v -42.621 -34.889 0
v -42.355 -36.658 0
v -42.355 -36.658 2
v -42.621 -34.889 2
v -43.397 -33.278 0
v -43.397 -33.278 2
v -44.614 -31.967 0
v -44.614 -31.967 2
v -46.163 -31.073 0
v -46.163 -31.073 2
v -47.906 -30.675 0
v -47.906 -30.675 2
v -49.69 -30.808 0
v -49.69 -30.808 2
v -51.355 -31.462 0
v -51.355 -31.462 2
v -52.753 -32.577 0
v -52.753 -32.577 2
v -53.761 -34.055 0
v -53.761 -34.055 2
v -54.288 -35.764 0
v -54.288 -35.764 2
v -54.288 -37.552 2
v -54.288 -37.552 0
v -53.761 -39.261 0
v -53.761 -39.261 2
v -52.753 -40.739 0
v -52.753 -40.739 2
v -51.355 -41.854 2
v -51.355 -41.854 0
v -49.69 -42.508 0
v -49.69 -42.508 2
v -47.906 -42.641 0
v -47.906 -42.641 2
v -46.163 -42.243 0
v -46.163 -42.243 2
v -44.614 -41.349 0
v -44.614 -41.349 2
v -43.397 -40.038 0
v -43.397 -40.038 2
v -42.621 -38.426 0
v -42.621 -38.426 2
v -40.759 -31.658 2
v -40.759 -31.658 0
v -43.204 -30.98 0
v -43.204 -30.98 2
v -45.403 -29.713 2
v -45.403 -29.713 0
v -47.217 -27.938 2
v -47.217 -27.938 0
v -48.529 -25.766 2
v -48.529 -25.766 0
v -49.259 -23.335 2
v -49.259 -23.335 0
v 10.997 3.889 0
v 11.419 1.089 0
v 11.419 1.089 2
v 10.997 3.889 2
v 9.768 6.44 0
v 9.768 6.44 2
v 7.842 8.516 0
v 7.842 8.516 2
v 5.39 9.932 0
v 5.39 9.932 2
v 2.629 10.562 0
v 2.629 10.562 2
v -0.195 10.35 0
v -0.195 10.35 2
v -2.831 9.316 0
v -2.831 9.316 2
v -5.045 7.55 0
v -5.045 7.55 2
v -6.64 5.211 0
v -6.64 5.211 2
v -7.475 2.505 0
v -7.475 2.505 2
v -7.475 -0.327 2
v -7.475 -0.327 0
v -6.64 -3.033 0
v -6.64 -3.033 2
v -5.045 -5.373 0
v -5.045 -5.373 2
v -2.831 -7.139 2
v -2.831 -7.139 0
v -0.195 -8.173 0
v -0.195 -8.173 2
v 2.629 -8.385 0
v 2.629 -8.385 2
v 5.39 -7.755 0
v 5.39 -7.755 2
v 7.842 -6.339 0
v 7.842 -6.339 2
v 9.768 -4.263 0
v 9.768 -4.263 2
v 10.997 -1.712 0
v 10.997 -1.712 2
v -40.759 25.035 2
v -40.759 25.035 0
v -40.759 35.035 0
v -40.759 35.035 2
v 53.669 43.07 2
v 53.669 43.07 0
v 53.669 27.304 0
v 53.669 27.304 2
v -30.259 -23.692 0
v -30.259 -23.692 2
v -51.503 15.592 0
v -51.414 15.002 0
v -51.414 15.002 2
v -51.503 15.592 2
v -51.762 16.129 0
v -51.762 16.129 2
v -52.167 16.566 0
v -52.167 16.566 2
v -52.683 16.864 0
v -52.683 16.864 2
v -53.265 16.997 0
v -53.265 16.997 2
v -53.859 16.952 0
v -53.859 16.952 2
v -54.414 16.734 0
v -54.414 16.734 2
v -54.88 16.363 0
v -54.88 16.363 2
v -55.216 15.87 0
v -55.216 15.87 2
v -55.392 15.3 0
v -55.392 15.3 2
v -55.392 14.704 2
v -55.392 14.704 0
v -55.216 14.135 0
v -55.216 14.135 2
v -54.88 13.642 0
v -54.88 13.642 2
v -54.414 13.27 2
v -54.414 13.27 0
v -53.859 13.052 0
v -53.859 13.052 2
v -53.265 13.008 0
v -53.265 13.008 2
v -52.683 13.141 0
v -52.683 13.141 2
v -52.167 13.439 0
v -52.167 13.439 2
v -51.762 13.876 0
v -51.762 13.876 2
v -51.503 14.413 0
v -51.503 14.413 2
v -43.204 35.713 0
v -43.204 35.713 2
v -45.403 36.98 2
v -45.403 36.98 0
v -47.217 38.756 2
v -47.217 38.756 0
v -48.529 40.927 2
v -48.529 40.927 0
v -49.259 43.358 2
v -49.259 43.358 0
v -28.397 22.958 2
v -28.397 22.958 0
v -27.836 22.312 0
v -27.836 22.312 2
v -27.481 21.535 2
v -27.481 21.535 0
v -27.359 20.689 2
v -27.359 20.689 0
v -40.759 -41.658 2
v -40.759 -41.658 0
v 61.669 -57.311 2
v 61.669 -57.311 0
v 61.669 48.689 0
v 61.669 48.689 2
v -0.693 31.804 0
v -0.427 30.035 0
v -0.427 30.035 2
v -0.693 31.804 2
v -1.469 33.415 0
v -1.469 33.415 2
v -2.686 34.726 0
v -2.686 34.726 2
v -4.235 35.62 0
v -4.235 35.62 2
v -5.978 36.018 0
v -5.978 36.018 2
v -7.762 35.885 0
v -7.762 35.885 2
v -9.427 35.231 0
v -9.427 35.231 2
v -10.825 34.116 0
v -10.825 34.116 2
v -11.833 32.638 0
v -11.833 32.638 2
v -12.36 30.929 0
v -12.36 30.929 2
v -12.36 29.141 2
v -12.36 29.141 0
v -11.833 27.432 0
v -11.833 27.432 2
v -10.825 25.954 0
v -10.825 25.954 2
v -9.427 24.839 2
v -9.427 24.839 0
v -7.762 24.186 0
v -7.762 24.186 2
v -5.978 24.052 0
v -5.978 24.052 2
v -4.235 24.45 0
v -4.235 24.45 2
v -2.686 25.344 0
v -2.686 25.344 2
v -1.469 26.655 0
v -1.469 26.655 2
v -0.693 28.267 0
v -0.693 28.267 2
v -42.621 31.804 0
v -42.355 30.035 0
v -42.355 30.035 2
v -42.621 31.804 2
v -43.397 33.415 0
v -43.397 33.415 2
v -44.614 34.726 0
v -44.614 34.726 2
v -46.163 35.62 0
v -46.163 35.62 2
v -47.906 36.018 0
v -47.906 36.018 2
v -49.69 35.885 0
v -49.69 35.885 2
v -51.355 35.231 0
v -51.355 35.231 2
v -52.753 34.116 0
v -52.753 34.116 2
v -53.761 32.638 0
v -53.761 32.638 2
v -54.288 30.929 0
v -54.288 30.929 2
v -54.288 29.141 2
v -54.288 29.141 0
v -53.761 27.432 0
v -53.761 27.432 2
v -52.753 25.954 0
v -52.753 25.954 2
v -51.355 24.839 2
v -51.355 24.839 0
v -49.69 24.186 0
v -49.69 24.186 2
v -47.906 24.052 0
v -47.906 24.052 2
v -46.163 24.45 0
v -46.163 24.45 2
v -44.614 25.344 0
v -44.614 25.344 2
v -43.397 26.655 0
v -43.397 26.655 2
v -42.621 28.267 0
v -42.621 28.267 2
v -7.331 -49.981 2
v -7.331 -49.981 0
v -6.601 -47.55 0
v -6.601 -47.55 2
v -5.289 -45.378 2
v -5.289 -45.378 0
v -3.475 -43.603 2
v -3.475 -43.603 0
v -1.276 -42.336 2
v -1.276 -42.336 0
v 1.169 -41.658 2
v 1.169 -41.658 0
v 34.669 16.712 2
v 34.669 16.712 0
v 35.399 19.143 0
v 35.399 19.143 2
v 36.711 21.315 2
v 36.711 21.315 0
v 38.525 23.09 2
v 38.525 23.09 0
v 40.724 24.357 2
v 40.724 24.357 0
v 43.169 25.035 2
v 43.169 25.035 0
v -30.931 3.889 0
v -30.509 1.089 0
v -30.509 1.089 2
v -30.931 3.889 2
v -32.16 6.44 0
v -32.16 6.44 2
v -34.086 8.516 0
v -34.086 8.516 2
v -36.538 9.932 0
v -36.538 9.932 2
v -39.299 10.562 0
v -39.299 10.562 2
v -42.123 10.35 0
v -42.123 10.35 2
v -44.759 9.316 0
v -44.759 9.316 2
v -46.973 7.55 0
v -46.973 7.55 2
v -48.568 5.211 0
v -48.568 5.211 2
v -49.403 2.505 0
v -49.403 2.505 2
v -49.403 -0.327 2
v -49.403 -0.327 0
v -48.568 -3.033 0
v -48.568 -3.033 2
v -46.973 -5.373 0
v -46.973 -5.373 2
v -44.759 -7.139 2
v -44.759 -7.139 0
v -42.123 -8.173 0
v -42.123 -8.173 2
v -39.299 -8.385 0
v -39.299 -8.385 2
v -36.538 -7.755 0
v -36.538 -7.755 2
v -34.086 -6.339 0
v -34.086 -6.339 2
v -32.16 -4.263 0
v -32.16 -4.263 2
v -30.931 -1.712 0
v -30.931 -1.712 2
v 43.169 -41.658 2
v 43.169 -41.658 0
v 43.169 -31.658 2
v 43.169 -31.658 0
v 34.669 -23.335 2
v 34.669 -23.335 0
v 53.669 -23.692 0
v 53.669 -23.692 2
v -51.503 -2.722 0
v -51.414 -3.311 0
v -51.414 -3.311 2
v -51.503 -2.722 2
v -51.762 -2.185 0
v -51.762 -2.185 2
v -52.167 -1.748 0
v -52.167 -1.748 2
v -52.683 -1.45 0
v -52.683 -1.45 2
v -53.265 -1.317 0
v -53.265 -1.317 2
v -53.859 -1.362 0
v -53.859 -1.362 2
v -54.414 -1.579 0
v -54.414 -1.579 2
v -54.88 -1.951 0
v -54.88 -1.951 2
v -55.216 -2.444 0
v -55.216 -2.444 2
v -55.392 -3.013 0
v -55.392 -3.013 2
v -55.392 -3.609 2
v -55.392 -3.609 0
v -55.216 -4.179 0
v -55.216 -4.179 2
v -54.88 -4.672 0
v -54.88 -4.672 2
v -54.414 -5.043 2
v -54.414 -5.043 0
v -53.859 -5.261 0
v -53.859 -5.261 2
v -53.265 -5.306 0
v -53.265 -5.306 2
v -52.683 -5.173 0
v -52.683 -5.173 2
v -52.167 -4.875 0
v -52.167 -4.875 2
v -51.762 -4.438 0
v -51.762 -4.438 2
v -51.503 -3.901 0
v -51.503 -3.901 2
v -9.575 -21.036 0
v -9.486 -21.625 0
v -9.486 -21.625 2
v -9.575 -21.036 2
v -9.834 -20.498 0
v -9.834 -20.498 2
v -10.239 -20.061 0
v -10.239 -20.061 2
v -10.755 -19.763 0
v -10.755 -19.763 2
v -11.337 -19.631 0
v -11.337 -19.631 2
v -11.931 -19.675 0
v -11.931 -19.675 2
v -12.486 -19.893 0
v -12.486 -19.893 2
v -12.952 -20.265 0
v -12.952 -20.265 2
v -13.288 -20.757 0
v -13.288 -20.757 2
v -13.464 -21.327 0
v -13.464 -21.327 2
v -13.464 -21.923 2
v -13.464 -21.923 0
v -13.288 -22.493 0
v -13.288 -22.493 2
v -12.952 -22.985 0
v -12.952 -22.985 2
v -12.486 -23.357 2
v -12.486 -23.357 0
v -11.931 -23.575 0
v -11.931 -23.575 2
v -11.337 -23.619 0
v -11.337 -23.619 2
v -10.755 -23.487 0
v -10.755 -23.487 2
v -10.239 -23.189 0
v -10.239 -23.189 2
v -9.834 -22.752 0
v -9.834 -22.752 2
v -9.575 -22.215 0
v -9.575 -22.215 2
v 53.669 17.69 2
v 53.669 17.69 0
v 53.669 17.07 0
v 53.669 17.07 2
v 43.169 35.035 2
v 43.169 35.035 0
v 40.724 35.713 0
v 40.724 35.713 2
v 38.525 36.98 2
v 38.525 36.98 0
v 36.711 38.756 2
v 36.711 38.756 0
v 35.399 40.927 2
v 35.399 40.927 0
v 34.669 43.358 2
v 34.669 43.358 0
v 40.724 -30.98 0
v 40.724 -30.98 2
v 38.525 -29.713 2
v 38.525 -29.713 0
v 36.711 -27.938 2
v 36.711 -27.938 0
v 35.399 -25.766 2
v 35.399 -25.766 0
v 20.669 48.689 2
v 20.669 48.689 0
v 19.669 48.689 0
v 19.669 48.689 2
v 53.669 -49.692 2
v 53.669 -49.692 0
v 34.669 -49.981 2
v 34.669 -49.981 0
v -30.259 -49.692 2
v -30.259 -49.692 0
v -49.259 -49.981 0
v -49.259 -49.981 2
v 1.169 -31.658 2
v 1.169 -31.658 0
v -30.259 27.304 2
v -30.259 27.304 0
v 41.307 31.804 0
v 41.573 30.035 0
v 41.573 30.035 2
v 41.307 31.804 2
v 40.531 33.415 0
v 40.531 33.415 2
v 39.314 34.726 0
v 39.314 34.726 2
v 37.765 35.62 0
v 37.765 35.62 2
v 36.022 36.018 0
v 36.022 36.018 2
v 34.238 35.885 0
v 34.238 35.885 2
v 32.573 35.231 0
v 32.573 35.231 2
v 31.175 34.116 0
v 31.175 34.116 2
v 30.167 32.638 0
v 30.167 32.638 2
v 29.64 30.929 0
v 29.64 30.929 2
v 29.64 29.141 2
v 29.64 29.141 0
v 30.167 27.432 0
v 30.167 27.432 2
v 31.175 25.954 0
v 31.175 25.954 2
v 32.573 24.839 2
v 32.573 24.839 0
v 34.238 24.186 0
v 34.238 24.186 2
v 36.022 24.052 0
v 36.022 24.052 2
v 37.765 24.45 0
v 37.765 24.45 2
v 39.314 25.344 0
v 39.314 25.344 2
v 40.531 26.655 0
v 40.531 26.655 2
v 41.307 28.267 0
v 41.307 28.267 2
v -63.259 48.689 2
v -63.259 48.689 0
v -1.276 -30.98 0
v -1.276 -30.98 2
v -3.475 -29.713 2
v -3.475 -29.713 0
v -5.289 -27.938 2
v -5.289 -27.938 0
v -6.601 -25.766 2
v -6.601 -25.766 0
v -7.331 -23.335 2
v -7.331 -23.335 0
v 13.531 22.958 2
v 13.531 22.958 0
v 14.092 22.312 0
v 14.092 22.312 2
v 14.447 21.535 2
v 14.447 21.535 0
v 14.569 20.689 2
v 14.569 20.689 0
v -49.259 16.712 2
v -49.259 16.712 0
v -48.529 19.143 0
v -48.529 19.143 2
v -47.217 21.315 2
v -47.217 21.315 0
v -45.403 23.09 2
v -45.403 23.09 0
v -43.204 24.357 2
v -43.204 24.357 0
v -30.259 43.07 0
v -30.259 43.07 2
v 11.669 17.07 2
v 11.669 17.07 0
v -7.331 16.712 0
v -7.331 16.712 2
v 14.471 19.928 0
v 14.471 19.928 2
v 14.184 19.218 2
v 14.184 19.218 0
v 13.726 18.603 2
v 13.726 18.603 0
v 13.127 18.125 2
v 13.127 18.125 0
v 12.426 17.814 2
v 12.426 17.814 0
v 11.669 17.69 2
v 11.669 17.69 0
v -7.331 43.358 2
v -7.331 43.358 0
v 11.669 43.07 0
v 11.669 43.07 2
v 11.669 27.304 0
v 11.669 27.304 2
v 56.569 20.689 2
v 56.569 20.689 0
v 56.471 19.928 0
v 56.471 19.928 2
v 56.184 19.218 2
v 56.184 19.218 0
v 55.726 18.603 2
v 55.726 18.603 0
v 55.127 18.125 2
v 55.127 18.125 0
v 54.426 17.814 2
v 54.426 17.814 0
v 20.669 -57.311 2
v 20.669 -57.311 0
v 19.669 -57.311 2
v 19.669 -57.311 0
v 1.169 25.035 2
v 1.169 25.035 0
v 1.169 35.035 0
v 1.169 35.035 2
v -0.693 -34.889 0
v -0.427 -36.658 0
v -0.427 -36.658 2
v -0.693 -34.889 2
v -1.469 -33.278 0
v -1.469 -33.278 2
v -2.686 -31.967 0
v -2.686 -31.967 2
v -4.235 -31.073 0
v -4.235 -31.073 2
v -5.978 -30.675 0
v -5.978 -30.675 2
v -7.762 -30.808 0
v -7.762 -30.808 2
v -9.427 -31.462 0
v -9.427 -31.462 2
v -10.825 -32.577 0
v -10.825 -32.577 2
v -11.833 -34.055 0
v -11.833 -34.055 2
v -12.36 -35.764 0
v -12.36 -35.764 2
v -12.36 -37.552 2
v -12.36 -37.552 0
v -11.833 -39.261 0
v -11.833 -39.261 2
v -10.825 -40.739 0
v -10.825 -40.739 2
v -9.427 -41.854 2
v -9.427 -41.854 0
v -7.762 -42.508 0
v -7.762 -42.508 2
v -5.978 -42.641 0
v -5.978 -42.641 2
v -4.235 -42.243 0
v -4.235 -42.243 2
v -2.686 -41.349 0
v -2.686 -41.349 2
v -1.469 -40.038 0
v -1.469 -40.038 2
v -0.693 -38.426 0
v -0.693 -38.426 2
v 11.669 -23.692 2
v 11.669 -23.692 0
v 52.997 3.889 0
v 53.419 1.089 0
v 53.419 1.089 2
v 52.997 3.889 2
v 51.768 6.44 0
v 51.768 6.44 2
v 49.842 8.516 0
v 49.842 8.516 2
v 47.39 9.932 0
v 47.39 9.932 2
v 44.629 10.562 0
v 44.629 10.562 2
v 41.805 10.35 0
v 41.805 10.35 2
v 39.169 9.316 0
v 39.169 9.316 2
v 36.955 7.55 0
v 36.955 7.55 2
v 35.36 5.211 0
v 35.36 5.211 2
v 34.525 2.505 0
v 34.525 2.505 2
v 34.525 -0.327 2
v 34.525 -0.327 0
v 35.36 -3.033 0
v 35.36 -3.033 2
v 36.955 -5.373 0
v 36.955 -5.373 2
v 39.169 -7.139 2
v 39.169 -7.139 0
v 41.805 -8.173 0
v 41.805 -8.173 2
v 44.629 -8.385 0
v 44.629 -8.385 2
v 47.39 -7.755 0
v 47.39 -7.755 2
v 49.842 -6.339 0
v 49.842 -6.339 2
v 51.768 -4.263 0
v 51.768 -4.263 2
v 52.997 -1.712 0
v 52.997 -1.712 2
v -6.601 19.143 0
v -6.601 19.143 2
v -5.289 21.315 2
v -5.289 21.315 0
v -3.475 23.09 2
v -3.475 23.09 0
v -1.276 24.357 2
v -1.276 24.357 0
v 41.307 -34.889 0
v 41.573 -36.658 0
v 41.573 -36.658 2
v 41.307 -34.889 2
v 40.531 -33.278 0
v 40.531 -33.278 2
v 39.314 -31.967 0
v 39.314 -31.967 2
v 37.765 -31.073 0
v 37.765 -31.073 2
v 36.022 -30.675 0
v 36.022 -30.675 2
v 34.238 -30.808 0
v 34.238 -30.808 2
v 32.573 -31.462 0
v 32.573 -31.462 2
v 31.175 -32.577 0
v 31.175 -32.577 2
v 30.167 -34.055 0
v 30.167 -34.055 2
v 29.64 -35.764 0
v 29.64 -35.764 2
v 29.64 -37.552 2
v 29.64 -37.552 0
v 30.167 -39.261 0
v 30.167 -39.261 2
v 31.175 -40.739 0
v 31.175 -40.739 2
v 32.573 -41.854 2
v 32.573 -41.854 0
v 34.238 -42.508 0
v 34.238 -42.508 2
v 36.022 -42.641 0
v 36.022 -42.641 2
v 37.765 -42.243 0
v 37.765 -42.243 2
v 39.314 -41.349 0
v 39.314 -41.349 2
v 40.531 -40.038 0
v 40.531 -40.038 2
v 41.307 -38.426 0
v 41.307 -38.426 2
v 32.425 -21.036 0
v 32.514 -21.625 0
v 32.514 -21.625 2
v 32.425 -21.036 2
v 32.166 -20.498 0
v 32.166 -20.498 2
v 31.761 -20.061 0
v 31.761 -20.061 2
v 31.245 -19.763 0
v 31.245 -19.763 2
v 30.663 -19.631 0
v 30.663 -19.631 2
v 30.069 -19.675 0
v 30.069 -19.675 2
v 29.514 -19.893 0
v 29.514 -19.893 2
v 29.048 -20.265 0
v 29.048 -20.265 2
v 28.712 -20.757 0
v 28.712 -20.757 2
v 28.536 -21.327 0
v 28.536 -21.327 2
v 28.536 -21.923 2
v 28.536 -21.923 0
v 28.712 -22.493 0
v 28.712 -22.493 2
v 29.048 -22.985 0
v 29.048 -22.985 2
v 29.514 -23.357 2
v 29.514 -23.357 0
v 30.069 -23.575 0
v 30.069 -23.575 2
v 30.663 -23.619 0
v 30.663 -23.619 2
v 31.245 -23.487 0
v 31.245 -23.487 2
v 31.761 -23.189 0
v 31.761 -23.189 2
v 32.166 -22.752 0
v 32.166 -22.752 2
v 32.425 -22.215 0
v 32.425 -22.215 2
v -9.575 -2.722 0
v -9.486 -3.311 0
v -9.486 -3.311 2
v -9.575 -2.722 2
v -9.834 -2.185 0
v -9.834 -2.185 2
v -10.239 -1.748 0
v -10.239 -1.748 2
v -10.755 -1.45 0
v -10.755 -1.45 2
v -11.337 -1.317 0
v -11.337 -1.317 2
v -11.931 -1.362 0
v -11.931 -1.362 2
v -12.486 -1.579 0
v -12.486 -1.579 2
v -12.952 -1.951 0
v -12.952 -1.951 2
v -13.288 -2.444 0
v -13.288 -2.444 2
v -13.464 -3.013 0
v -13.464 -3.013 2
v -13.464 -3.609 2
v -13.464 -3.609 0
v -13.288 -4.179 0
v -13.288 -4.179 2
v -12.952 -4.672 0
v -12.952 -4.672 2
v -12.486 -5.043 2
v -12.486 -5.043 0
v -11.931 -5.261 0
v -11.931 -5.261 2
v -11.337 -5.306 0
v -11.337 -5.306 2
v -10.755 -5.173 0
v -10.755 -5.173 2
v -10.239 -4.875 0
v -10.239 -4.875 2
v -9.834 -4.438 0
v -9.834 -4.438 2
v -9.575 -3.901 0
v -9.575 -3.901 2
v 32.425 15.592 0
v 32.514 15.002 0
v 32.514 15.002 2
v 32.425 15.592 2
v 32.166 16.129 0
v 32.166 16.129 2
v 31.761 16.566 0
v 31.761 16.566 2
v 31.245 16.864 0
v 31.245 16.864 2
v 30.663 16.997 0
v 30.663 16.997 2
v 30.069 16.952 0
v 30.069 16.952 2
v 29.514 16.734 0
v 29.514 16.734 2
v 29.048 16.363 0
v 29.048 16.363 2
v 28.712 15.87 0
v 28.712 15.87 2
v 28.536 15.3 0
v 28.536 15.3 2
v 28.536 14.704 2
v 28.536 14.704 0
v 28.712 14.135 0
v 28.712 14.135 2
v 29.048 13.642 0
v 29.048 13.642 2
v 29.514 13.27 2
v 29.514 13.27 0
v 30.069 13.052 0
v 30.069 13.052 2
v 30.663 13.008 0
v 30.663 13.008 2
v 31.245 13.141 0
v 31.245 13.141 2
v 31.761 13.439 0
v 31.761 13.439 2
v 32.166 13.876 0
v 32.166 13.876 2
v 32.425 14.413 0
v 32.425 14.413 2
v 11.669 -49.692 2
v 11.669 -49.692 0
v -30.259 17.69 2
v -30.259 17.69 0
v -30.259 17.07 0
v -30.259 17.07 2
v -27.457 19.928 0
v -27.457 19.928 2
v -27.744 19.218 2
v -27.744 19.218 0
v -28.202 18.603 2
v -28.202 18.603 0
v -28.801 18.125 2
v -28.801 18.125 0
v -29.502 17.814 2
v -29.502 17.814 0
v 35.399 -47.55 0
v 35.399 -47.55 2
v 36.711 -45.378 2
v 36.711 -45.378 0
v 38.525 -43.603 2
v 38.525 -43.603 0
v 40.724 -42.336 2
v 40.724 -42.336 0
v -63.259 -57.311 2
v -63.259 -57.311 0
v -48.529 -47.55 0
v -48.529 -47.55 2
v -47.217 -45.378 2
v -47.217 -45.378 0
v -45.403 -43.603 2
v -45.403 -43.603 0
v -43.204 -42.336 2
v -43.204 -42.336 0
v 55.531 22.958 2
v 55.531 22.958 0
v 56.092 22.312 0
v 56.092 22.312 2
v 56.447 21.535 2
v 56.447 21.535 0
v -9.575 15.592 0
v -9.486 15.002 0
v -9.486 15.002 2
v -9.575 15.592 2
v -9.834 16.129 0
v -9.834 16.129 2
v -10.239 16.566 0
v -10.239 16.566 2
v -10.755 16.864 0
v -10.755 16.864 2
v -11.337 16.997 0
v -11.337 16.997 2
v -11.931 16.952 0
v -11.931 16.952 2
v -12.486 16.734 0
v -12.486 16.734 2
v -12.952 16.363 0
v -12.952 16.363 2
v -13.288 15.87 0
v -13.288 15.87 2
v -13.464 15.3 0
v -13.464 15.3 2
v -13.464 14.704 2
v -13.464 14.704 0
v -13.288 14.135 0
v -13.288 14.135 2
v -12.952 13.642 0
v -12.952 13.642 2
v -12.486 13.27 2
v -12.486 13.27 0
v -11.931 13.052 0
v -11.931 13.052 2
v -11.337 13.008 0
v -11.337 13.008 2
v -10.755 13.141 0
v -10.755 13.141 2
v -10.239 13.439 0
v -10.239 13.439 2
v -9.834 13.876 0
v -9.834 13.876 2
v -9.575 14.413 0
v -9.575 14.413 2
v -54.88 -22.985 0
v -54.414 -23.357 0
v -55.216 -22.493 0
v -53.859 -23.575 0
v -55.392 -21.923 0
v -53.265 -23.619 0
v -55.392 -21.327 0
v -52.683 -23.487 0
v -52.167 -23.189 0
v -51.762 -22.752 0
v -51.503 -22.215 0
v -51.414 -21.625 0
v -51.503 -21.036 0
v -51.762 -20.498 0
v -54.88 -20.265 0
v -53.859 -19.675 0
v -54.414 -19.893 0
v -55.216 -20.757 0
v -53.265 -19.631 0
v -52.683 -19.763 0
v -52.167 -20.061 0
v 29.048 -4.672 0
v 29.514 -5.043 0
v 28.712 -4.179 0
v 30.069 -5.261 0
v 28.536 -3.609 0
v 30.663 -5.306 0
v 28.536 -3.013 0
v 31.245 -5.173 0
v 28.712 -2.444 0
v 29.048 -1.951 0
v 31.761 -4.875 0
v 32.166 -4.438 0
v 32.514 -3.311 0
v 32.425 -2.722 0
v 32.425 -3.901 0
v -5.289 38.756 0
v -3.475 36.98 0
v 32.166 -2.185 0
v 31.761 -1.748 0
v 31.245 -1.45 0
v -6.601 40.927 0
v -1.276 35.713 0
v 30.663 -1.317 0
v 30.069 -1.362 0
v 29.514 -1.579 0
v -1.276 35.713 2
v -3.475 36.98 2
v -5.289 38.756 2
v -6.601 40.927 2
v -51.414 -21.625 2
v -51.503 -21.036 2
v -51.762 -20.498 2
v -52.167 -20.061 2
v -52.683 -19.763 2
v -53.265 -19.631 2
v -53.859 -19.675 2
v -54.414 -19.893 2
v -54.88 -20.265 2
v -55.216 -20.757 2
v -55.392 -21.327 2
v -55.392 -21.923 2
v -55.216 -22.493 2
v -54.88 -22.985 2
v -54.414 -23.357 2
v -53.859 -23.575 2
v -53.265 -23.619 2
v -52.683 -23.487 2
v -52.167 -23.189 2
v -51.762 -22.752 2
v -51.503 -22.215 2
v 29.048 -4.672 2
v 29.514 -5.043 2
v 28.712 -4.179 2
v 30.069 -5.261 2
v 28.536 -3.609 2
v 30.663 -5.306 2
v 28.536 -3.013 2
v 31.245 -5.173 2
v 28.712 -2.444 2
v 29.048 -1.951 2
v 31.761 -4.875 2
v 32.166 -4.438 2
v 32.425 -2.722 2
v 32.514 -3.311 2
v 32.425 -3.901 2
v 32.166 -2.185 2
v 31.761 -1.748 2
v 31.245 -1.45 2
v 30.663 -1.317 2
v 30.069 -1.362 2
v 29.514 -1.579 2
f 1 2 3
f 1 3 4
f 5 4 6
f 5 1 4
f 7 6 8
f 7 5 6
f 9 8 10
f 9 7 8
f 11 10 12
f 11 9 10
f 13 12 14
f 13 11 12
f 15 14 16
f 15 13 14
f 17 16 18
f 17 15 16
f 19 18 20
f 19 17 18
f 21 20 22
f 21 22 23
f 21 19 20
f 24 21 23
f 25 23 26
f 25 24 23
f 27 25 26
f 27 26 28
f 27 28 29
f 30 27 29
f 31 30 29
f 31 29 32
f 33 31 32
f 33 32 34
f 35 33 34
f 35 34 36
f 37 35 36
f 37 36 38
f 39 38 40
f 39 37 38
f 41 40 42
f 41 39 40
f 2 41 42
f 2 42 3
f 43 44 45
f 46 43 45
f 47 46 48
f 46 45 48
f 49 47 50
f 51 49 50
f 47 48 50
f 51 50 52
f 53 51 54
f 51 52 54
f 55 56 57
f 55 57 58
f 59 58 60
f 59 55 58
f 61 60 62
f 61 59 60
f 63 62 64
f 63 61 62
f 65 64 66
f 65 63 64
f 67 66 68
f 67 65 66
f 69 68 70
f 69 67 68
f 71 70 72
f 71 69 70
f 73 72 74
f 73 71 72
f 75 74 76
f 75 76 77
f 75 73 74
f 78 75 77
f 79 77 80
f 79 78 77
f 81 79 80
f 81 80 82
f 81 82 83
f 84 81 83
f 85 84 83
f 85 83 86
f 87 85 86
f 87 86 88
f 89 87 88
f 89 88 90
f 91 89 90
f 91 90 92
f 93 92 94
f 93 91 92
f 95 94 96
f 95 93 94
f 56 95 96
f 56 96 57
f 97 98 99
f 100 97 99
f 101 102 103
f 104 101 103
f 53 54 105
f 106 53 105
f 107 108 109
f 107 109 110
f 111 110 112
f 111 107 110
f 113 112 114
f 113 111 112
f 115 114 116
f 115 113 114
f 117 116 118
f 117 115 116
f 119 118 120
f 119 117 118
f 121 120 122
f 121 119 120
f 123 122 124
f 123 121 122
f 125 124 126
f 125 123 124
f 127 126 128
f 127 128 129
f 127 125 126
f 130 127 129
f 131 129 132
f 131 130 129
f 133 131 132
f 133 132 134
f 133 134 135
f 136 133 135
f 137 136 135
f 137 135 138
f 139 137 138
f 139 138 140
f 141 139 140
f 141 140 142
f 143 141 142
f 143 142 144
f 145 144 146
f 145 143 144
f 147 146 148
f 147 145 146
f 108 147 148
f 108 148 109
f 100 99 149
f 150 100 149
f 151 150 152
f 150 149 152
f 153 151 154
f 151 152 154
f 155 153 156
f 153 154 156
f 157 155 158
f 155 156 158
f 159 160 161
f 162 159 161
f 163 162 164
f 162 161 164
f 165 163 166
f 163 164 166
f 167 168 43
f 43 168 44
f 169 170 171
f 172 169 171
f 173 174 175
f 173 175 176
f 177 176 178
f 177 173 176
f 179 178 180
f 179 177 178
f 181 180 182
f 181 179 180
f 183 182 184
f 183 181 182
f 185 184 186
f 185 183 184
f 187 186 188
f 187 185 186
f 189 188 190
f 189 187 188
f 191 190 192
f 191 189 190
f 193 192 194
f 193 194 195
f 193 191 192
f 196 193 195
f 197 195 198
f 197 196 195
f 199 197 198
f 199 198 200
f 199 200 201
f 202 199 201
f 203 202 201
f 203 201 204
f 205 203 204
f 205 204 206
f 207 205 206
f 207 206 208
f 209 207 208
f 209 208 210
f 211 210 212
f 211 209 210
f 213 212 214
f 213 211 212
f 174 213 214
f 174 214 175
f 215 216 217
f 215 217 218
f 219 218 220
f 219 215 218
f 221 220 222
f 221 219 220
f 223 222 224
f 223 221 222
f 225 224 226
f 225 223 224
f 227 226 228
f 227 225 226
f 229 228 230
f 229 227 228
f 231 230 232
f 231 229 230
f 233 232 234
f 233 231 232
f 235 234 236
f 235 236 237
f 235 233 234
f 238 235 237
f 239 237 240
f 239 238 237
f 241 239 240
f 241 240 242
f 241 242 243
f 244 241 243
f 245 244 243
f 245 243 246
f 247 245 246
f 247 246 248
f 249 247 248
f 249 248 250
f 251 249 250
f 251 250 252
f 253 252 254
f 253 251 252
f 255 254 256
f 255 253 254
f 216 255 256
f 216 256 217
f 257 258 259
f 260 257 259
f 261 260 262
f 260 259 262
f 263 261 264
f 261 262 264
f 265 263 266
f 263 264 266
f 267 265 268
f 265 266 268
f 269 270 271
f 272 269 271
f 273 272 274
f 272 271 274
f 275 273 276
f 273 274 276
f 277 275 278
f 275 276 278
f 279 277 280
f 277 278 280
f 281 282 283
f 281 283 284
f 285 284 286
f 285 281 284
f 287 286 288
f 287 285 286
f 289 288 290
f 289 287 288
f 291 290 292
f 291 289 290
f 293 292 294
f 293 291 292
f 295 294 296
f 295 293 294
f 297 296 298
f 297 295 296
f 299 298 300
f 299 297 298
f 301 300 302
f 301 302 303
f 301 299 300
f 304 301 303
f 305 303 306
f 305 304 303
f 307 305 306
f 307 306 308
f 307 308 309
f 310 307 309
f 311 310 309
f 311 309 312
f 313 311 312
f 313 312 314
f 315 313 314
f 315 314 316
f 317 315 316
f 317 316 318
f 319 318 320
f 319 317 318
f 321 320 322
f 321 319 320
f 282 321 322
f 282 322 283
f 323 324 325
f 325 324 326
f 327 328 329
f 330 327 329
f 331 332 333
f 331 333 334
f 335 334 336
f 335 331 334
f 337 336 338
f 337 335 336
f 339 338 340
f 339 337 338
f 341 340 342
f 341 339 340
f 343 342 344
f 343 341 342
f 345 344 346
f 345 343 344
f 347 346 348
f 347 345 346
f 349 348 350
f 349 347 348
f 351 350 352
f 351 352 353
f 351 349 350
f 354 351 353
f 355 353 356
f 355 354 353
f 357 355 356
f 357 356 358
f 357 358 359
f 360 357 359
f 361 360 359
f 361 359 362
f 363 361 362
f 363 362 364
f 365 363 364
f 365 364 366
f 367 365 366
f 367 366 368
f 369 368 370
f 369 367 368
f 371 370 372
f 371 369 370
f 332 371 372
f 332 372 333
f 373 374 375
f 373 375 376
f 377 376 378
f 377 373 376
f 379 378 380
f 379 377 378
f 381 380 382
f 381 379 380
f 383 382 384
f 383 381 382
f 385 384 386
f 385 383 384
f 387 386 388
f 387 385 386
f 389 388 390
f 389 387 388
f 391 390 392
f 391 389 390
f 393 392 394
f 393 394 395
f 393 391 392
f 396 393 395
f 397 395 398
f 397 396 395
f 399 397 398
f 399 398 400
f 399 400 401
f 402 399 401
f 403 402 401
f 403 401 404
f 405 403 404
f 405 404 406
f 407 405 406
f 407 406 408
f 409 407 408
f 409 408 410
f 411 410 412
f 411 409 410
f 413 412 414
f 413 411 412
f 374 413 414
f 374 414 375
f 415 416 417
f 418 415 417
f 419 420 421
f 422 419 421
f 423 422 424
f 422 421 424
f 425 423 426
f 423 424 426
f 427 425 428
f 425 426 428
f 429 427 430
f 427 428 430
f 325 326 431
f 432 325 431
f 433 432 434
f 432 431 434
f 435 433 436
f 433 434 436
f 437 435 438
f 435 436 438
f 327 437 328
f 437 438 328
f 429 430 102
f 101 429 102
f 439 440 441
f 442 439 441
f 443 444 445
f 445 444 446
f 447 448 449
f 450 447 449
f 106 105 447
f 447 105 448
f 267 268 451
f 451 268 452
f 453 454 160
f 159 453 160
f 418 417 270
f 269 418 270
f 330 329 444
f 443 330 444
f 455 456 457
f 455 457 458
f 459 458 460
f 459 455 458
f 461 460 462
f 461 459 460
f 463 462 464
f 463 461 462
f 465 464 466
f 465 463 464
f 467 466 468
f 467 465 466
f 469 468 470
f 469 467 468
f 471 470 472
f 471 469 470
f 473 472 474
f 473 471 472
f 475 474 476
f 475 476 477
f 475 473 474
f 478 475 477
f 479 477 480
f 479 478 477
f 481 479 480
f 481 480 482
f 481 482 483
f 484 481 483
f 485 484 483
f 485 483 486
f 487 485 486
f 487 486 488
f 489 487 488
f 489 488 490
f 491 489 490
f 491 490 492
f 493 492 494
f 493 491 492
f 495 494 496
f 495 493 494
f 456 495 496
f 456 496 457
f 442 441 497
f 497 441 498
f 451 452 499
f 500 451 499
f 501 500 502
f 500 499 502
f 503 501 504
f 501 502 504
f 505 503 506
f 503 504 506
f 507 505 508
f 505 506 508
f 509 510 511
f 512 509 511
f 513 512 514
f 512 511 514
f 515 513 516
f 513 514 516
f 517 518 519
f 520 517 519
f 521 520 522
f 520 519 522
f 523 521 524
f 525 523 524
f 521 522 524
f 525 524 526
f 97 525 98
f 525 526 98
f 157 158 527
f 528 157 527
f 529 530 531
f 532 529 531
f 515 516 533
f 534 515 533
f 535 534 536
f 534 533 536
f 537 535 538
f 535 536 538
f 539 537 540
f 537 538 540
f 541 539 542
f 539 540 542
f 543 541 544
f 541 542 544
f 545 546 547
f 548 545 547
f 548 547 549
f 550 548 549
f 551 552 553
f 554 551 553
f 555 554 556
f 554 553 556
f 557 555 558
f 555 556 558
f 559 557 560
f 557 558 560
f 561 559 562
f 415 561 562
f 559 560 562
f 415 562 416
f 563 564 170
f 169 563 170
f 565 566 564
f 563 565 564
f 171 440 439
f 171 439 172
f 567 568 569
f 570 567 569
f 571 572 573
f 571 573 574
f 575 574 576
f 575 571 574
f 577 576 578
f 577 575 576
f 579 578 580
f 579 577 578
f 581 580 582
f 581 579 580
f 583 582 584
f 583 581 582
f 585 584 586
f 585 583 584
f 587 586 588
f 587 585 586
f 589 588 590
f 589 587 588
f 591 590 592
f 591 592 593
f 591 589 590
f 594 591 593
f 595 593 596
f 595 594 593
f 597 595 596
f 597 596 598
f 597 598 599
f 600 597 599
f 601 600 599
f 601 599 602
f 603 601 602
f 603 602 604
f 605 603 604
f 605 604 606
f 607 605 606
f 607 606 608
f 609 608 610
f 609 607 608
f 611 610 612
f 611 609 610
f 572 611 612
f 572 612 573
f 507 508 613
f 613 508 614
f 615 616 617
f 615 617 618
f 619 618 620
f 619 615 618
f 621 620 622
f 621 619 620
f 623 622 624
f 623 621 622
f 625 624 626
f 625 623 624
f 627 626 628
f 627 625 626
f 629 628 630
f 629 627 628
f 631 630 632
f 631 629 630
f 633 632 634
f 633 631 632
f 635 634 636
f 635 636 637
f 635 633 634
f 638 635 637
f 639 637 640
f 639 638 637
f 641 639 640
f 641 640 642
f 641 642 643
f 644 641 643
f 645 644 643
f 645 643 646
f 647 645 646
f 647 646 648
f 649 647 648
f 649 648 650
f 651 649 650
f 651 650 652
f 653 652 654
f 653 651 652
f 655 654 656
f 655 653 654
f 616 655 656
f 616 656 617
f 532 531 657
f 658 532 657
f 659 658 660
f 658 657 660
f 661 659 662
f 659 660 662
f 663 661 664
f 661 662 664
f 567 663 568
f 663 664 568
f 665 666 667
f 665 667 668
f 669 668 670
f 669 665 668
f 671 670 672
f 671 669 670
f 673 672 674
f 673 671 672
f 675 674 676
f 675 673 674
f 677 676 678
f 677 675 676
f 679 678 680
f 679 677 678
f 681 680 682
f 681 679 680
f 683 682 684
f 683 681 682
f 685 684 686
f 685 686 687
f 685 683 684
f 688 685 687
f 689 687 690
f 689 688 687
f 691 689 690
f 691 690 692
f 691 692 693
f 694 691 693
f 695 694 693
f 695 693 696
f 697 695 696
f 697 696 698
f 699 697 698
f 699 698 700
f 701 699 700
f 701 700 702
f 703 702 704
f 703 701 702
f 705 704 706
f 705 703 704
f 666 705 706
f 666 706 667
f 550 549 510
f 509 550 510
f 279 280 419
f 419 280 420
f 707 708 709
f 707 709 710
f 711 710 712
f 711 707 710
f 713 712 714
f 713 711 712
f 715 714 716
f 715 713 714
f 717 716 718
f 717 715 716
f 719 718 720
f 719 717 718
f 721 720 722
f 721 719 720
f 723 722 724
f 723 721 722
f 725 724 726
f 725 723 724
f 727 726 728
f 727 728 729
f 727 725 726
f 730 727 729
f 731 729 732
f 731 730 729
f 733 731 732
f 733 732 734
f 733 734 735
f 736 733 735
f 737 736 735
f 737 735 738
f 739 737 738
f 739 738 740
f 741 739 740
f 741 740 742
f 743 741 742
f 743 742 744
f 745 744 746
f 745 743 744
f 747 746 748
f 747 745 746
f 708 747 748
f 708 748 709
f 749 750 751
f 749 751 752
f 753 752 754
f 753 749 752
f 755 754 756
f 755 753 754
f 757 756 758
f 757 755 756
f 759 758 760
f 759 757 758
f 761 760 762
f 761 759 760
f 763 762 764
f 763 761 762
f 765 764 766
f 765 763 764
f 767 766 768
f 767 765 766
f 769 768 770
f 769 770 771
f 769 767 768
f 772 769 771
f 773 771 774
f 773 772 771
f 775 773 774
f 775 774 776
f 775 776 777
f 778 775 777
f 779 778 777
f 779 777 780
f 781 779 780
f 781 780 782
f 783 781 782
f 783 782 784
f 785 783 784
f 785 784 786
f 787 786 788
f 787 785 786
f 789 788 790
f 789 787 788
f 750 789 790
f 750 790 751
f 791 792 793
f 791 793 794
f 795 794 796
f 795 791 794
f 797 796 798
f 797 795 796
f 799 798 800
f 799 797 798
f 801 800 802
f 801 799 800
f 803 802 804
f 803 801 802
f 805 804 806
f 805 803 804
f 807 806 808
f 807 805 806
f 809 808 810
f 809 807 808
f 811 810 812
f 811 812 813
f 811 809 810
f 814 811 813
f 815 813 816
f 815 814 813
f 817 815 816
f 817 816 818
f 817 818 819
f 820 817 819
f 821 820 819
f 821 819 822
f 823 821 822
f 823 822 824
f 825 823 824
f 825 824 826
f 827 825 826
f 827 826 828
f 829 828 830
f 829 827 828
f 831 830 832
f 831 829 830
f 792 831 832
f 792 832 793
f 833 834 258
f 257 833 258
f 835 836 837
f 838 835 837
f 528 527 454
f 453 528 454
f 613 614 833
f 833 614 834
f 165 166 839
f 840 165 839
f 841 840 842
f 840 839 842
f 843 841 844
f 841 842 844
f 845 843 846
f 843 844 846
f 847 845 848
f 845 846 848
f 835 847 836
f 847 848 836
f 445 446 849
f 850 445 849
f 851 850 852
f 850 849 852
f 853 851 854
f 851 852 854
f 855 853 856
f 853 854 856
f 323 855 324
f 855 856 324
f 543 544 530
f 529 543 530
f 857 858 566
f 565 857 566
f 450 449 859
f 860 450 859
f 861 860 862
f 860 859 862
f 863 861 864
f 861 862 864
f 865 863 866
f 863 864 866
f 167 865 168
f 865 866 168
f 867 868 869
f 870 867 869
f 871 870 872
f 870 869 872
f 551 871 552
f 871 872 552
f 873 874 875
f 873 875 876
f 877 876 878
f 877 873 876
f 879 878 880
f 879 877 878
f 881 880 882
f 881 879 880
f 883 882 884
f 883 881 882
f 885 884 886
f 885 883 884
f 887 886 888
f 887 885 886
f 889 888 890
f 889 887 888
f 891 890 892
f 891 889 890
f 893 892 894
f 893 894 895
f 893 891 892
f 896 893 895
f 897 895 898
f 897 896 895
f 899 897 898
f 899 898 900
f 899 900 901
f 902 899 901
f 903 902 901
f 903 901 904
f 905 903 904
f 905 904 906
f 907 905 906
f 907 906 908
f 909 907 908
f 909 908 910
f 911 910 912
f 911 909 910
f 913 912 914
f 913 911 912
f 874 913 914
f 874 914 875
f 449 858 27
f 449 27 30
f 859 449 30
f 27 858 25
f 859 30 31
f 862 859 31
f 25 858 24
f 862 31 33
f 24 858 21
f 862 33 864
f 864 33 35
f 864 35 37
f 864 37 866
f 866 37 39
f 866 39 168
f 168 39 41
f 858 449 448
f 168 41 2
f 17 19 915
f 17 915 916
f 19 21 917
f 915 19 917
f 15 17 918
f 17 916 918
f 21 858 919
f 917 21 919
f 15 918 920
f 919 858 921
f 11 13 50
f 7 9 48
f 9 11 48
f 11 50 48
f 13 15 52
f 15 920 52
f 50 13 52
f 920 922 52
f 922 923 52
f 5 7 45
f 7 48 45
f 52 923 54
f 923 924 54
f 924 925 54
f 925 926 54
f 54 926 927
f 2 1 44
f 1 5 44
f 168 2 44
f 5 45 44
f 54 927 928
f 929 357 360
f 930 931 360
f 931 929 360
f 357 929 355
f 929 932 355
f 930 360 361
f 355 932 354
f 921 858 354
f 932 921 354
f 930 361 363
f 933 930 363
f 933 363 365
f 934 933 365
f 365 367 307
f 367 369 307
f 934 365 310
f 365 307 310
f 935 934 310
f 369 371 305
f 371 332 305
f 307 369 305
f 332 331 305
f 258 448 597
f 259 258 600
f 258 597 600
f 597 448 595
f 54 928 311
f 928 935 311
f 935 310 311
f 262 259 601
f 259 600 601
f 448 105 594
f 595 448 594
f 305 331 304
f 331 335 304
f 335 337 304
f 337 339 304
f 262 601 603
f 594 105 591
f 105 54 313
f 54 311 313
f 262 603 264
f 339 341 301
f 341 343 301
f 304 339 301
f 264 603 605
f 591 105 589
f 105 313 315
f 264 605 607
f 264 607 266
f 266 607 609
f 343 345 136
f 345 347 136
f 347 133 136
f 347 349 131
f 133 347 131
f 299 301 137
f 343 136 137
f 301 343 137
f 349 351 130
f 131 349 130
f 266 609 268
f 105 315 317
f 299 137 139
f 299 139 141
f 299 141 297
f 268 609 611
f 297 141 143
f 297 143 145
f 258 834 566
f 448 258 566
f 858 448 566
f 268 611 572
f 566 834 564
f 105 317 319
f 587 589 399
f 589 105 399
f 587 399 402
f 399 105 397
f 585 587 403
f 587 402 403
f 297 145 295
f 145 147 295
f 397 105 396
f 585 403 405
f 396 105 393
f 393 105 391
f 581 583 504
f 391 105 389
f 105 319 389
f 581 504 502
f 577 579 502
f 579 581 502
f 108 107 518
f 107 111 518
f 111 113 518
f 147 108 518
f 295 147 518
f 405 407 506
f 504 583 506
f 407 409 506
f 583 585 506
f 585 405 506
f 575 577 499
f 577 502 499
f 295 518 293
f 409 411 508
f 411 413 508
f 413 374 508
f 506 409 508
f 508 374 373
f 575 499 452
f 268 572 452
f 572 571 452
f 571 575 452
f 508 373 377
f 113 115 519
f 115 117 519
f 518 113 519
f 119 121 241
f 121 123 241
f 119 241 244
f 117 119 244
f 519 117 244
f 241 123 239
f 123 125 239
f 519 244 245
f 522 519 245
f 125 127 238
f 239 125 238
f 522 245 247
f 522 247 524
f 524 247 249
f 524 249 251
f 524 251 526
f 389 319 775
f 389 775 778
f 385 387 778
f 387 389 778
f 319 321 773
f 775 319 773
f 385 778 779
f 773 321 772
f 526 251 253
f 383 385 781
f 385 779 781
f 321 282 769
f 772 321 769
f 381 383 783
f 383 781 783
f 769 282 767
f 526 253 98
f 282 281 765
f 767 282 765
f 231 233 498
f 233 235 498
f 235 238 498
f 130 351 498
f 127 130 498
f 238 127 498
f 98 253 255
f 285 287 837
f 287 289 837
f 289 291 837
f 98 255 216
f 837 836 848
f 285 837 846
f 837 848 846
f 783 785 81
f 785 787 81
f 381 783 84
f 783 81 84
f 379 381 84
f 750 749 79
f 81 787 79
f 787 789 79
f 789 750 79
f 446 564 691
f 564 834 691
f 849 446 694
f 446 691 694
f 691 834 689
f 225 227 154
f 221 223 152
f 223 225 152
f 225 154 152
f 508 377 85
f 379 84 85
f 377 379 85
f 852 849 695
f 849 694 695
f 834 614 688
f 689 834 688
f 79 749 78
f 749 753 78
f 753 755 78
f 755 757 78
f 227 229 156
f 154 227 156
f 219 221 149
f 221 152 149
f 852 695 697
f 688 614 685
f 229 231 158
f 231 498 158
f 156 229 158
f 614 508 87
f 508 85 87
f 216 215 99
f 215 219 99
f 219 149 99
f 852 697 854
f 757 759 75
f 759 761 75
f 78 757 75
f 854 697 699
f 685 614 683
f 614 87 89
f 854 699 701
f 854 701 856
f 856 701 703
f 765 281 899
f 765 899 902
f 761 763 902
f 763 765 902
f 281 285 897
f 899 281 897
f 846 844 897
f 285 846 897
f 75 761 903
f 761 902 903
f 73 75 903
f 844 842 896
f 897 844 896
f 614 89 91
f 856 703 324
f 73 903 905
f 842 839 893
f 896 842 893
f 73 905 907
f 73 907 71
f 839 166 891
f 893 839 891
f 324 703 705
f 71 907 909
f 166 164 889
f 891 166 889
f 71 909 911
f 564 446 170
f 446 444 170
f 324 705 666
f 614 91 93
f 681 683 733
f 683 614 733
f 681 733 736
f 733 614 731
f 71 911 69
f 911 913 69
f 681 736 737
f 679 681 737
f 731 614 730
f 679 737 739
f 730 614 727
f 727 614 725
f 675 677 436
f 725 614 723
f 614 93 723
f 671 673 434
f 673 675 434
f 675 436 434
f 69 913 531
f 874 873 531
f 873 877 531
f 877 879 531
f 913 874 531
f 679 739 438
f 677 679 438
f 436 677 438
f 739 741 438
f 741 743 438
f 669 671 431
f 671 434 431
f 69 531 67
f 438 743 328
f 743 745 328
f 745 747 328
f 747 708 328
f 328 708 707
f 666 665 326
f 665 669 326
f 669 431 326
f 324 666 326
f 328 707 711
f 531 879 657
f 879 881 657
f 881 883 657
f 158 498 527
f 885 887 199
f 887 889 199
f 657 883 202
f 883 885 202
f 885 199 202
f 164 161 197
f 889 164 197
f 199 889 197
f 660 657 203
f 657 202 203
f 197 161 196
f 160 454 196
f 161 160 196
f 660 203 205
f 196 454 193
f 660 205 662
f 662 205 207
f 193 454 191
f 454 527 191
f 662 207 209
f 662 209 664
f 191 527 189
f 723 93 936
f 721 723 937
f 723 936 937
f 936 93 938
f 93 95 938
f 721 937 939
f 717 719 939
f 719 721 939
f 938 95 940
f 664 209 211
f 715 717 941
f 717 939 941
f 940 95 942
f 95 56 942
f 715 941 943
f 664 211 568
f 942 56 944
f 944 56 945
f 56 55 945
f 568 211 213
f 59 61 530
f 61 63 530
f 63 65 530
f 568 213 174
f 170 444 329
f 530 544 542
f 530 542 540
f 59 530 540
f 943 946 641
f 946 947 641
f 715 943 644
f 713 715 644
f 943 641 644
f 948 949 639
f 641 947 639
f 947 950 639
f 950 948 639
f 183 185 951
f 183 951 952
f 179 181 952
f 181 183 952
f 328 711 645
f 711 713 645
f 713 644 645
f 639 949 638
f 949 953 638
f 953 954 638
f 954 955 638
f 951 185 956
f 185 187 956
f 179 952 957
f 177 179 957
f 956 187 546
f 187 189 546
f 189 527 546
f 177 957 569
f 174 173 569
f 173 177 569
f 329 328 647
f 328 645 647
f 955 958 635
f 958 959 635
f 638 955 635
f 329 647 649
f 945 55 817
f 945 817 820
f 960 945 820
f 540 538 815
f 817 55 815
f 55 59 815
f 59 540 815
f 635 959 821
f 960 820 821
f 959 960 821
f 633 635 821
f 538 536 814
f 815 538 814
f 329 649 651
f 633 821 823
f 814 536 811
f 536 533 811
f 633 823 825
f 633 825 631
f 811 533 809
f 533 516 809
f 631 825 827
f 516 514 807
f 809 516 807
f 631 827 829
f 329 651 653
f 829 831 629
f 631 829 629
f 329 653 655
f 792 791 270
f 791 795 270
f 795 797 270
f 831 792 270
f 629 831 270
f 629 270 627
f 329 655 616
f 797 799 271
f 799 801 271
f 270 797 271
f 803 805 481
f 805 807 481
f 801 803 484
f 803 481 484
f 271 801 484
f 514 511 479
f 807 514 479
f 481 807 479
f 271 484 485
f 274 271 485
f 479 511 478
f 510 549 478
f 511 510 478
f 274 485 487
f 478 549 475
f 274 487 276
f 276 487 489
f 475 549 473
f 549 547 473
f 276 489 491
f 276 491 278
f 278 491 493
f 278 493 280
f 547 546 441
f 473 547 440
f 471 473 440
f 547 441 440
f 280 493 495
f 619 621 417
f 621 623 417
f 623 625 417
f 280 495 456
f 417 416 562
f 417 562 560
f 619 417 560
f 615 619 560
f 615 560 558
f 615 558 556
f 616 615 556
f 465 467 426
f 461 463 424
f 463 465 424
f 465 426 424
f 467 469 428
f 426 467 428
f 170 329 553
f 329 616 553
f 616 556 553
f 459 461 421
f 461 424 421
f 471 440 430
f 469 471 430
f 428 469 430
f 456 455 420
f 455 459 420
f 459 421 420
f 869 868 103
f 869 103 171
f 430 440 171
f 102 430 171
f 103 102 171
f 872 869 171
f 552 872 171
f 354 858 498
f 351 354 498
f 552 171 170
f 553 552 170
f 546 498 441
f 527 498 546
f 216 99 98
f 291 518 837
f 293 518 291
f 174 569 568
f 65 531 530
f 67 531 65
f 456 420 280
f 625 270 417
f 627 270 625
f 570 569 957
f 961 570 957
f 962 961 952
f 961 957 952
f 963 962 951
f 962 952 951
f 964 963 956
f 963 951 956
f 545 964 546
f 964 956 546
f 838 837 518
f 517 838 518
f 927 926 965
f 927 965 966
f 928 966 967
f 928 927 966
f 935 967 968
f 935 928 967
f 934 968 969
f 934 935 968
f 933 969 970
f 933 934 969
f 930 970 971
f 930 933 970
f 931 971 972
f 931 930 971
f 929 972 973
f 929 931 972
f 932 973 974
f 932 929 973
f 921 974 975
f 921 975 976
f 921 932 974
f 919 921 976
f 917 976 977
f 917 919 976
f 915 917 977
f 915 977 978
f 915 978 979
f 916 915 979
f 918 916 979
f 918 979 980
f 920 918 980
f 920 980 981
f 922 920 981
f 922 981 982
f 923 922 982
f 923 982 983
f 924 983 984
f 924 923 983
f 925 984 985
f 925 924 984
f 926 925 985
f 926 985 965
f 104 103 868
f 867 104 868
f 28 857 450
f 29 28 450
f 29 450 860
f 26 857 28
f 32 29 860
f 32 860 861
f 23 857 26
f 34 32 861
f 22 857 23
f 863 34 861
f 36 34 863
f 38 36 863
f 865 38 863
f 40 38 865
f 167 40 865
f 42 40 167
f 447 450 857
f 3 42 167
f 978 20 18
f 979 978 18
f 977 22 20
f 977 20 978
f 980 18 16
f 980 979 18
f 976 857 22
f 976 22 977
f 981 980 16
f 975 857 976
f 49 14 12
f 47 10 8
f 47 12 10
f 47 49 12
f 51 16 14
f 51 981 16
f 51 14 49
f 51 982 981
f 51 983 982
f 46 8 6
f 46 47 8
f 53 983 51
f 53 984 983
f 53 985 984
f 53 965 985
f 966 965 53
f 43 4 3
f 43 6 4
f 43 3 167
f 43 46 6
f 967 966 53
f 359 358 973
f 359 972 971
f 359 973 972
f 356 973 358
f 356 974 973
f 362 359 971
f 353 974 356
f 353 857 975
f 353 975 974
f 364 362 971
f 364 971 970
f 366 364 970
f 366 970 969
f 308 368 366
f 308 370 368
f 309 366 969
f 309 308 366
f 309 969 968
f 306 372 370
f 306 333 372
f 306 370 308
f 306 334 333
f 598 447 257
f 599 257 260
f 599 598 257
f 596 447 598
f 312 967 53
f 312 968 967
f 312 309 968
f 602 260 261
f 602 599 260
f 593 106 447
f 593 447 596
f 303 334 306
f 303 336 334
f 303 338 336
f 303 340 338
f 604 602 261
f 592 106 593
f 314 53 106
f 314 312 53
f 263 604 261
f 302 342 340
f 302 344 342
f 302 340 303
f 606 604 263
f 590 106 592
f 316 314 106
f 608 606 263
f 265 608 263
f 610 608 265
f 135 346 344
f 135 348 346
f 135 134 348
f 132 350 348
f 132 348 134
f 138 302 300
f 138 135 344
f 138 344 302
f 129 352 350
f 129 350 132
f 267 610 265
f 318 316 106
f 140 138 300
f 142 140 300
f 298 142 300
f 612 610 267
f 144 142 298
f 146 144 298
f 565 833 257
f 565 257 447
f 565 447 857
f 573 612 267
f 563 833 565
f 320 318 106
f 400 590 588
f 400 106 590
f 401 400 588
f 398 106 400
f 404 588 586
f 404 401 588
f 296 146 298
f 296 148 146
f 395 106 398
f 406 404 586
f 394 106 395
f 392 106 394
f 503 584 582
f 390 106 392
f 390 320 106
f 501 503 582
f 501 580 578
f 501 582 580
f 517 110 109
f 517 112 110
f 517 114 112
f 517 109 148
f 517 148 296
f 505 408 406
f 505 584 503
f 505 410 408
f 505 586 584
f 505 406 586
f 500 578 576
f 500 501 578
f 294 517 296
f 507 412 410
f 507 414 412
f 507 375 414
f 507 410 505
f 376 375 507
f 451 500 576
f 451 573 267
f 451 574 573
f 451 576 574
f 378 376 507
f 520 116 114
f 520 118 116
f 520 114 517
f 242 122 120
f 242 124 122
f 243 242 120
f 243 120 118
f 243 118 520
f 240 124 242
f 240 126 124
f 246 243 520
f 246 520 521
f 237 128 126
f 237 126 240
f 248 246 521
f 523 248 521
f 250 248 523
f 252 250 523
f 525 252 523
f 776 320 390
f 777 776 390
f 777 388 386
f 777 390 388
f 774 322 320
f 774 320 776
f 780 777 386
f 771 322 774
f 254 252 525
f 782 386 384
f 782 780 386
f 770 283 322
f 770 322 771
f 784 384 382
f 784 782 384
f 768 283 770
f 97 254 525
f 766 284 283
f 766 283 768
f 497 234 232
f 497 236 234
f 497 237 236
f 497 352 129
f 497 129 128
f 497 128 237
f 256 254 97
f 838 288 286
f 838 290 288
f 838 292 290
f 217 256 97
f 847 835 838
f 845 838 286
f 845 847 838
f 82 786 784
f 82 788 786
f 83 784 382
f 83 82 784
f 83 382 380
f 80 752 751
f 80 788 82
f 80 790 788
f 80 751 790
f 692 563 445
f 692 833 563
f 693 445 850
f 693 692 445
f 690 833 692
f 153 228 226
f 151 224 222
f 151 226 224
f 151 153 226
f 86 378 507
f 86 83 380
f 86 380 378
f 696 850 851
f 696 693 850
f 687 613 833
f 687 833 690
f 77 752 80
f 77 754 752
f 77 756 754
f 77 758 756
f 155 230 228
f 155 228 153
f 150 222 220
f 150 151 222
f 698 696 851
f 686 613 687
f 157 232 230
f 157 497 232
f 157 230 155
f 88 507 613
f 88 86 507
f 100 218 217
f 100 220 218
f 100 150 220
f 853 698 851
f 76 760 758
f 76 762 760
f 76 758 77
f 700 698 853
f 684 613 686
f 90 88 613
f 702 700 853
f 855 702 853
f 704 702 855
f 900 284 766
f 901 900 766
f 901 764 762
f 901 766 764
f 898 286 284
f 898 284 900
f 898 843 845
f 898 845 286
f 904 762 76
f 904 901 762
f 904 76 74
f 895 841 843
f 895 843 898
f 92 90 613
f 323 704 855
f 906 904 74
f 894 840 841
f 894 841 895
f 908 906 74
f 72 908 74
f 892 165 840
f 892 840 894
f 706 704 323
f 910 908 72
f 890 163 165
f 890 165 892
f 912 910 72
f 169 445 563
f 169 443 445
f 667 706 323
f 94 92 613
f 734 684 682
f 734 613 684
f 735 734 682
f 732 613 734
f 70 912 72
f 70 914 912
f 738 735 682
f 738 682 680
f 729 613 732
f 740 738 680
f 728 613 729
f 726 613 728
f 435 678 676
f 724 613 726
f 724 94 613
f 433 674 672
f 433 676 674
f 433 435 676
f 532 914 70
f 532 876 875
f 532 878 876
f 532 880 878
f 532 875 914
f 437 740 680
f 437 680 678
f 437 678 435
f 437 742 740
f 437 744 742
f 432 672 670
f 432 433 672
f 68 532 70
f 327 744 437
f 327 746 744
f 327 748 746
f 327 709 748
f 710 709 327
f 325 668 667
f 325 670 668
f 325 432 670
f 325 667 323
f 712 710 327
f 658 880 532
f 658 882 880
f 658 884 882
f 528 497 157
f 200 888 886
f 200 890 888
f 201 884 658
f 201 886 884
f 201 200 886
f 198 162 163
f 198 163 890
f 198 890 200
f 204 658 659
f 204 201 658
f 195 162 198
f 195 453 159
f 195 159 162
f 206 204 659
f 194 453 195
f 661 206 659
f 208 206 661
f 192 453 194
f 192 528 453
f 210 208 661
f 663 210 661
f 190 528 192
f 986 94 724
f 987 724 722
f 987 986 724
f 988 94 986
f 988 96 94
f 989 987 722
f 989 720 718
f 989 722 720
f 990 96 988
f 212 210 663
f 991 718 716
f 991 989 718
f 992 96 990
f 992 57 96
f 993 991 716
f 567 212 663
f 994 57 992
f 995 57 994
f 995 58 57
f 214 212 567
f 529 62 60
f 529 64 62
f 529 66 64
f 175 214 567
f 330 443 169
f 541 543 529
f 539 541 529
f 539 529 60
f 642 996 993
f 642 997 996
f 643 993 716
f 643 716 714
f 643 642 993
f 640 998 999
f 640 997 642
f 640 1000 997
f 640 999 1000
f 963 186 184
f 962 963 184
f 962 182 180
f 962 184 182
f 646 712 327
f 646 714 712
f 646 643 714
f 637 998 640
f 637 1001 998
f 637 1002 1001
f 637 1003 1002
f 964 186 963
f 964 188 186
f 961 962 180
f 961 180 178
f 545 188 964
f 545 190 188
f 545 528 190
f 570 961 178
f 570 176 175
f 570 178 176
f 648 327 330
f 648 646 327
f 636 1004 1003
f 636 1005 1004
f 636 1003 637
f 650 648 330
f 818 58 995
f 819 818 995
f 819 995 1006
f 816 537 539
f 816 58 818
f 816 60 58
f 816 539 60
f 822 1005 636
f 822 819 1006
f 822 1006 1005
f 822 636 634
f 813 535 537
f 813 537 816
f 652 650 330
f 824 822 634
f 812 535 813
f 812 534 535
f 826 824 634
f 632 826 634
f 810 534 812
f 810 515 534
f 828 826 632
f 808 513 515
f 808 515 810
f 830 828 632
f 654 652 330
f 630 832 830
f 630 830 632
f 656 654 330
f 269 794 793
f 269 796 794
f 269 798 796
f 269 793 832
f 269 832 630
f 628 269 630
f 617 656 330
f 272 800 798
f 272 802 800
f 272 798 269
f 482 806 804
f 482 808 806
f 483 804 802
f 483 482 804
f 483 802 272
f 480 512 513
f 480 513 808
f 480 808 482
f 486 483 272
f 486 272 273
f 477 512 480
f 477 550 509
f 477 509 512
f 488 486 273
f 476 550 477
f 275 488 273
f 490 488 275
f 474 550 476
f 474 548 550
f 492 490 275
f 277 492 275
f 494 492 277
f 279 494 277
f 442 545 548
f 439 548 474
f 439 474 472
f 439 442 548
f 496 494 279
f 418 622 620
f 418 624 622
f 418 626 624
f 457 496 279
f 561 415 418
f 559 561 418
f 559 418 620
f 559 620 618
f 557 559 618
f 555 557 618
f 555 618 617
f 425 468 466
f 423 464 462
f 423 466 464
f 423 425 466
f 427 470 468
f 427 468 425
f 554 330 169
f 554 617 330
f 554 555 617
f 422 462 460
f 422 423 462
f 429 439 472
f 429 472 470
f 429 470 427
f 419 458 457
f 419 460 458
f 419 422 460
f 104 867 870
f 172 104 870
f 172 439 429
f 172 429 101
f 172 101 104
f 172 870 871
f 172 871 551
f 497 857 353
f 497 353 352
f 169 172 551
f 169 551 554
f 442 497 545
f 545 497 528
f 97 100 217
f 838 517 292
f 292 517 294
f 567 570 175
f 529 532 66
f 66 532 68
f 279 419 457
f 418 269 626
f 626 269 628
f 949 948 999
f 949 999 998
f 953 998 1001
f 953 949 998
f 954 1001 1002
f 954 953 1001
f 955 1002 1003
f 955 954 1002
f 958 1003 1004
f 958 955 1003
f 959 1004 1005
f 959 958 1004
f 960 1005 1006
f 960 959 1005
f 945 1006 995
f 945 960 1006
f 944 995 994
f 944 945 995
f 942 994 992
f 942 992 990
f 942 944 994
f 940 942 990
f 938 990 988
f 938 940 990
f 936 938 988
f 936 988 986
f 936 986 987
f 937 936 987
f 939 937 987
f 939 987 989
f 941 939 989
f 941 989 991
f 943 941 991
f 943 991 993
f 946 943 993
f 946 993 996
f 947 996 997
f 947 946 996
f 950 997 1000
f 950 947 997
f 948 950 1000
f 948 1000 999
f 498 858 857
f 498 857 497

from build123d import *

# Parameters (mm, degrees)
F0_W     = 41
F0_H     = 106
F0_R     = 6
F0_R_2   = 2
F0_R_3   = 9.5
F0_W_2   = 0.927996
F1_DEPTH = 2


with BuildPart() as f1:
    # F0 (on Top) → F1 (new body)
    with BuildSketch(Plane.XY):
        with Locations((-42.758821, -4.311392)):
            Rectangle(F0_W, F0_H)
        with Locations((-48.35481, -36.657964)):
            Circle(F0_R, mode=Mode.SUBTRACT)
        with BuildLine():
            ThreePointArc((-40.758821, -31.657964), (-46.365975, -28.882496), (-49.258821, -23.334988))
            Line((-49.258821, -23.334988), (-30.258821, -23.692439))
            Line((-30.258821, -23.692439), (-30.258821, -49.692439))
            Line((-30.258821, -49.692439), (-49.258821, -49.98094))
            ThreePointArc((-49.258821, -49.98094), (-46.365975, -44.433432), (-40.758821, -41.657964))
            Line((-40.758821, -41.657964), (-40.758821, -31.657964))
        make_face(mode=Mode.SUBTRACT)
        with Locations((-53.414003, -21.625079)):
            Circle(F0_R_2, mode=Mode.SUBTRACT)
        with Locations((-53.414003, -3.311392)):
            Circle(F0_R_2, mode=Mode.SUBTRACT)
        with Locations((-40.008821, 1.088608)):
            Circle(F0_R_3, mode=Mode.SUBTRACT)
        with Locations((-53.414003, 15.002295)):
            Circle(F0_R_2, mode=Mode.SUBTRACT)
        with Locations((-48.35481, 30.03518)):
            Circle(F0_R, mode=Mode.SUBTRACT)
        with BuildLine():
            ThreePointArc((-40.758821, 35.03518), (-46.365975, 37.810648), (-49.258821, 43.358156))
            Line((-49.258821, 43.358156), (-30.258821, 43.069655))
            Line((-30.258821, 43.069655), (-30.258821, 27.304233))
            Line((-30.258821, 27.304233), (-28.396592, 22.957894))
            ThreePointArc((-28.396592, 22.957894), (-27.630572, 21.936268), (-27.358821, 20.688608))
            ThreePointArc((-27.358821, 20.688608), (-28.202435, 18.602943), (-30.258821, 17.690275))
            Line((-30.258821, 17.690275), (-30.258821, 17.069655))
            Line((-30.258821, 17.069655), (-49.258821, 16.712204))
            ThreePointArc((-49.258821, 16.712204), (-46.365975, 22.259712), (-40.758821, 25.03518))
            Line((-40.758821, 25.03518), (-40.758821, 35.03518))
        make_face(mode=Mode.SUBTRACT)
        with Locations((-21.794823, -4.311392)):
            Rectangle(F0_W_2, F0_H)
        with Locations((-0.830825, -4.311392)):
            Rectangle(F0_W, F0_H)
        with Locations((-6.426815, -36.657964)):
            Circle(F0_R, mode=Mode.SUBTRACT)
        with Locations((-11.486007, -21.625079)):
            Circle(F0_R_2, mode=Mode.SUBTRACT)
        with BuildLine():
            ThreePointArc((1.169175, -31.657964), (-4.437979, -28.882496), (-7.330825, -23.334988))
            Line((-7.330825, -23.334988), (11.669175, -23.692439))
            Line((11.669175, -23.692439), (11.669175, -49.692439))
            Line((11.669175, -49.692439), (-7.330825, -49.98094))
            ThreePointArc((-7.330825, -49.98094), (-4.437979, -44.433432), (1.169175, -41.657964))
            Line((1.169175, -41.657964), (1.169175, -31.657964))
        make_face(mode=Mode.SUBTRACT)
        with Locations((-11.486007, -3.311392)):
            Circle(F0_R_2, mode=Mode.SUBTRACT)
        with Locations((-11.486007, 15.002295)):
            Circle(F0_R_2, mode=Mode.SUBTRACT)
        with Locations((-6.426815, 30.03518)):
            Circle(F0_R, mode=Mode.SUBTRACT)
        with Locations((1.919175, 1.088608)):
            Circle(F0_R_3, mode=Mode.SUBTRACT)
        with BuildLine():
            ThreePointArc((1.169175, 35.03518), (-4.437979, 37.810648), (-7.330825, 43.358156))
            Line((-7.330825, 43.358156), (11.669175, 43.069655))
            Line((11.669175, 43.069655), (11.669175, 27.304233))
            Line((11.669175, 27.304233), (13.531403, 22.957894))
            ThreePointArc((13.531403, 22.957894), (14.297424, 21.936268), (14.569175, 20.688608))
            ThreePointArc((14.569175, 20.688608), (13.725561, 18.602943), (11.669175, 17.690275))
            Line((11.669175, 17.690275), (11.669175, 17.069655))
            Line((11.669175, 17.069655), (-7.330825, 16.712204))
            ThreePointArc((-7.330825, 16.712204), (-4.437979, 22.259712), (1.169175, 25.03518))
            Line((1.169175, 25.03518), (1.169175, 35.03518))
        make_face(mode=Mode.SUBTRACT)
        Polygon((20.669173, 48.688607), (19.669175, 48.688608), (19.669175, -57.311392), (20.669173, -57.311393), align=None)
        with Locations((41.169173, -4.311393)):
            Rectangle(F0_W, F0_H)
        with Locations((35.573184, -36.657965)):
            Circle(F0_R, mode=Mode.SUBTRACT)
        with BuildLine():
            ThreePointArc((43.169173, -31.657965), (37.562019, -28.882497), (34.669173, -23.33499))
            Line((34.669173, -23.33499), (53.669173, -23.692441))
            Line((53.669173, -23.692441), (53.669173, -49.692441))
            Line((53.669173, -49.692441), (34.669173, -49.980941))
            ThreePointArc((34.669173, -49.980941), (37.562019, -44.433434), (43.169173, -41.657965))
            Line((43.169173, -41.657965), (43.169173, -31.657965))
        make_face(mode=Mode.SUBTRACT)
        with Locations((30.513992, -21.62508)):
            Circle(F0_R_2, mode=Mode.SUBTRACT)
        with Locations((30.513992, -3.311393)):
            Circle(F0_R_2, mode=Mode.SUBTRACT)
        with Locations((43.919173, 1.088607)):
            Circle(F0_R_3, mode=Mode.SUBTRACT)
        with Locations((30.513992, 15.002294)):
            Circle(F0_R_2, mode=Mode.SUBTRACT)
        with Locations((35.573184, 30.035179)):
            Circle(F0_R, mode=Mode.SUBTRACT)
        with BuildLine():
            ThreePointArc((43.169173, 35.035179), (37.562019, 37.810647), (34.669173, 43.358155))
            Line((34.669173, 43.358155), (53.669173, 43.069654))
            Line((53.669173, 43.069654), (53.669173, 27.304232))
            Line((53.669173, 27.304232), (55.531402, 22.957893))
            ThreePointArc((55.531402, 22.957893), (56.297423, 21.936267), (56.569173, 20.688607))
            ThreePointArc((56.569173, 20.688607), (55.725559, 18.602941), (53.669173, 17.690274))
            Line((53.669173, 17.690274), (53.669173, 17.069654))
            Line((53.669173, 17.069654), (34.669173, 16.712203))
            ThreePointArc((34.669173, 16.712203), (37.562019, 22.259711), (43.169173, 25.035179))
            Line((43.169173, 25.035179), (43.169173, 35.035179))
        make_face(mode=Mode.SUBTRACT)
    extrude(amount=F1_DEPTH)


solid = f1.part
